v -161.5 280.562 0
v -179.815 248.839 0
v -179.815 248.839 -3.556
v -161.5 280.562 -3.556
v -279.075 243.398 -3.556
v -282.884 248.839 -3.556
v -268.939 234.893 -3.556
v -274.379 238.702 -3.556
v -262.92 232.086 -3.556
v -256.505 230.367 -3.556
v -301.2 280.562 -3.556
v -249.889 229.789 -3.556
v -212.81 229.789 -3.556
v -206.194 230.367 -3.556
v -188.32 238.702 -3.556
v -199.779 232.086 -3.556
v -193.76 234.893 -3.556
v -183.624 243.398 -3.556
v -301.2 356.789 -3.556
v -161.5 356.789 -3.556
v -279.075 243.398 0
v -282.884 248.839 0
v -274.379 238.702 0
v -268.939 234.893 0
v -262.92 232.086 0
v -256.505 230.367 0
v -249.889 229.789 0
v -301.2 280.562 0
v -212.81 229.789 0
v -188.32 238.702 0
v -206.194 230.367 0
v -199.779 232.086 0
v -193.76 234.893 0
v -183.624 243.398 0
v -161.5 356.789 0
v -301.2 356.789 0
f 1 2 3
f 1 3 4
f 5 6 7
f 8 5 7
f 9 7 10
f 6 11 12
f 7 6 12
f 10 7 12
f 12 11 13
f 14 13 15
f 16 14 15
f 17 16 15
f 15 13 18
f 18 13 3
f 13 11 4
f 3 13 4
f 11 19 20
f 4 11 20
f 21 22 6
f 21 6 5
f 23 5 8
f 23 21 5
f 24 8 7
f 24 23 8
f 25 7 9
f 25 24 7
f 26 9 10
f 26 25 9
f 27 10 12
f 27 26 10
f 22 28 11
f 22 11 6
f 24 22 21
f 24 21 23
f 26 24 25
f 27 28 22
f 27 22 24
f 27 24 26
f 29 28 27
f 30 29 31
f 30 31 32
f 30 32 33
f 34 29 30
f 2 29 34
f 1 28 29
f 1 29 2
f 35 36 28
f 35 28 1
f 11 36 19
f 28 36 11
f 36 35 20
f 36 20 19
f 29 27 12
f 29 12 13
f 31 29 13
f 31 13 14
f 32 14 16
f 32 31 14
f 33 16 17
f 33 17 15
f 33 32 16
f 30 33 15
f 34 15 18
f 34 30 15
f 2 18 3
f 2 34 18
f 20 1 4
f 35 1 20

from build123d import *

# Parameters (mm, degrees)
BOSS_EXTRUDE1_DEPTH = 3.556


with BuildPart() as part:
    # Sketch1 → Boss-Extrude1 (new body)
    with BuildSketch(Plane.XY):
        with BuildLine():
            Line((-161.499532604, 280.561645896), (-161.499532604, 356.788581407))
            Line((-161.499532604, 356.788581407), (-301.19953221, 356.788581407))
            Line((-301.19953221, 356.788581407), (-301.19953221, 280.561645896))
            Line((-301.19953221, 280.561645896), (-282.884212388, 248.838581407))
            ThreePointArc((-282.884212388, 248.838581407), (-268.938644504, 234.893013523), (-249.888644504, 229.788581407))
            Line((-249.888644504, 229.788581407), (-212.81042031, 229.788581407))
            ThreePointArc((-212.81042031, 229.788581407), (-193.76042031, 234.893013523), (-179.814852426, 248.838581407))
            Line((-179.814852426, 248.838581407), (-161.499532604, 280.561645896))
        make_face()
    extrude(amount=-BOSS_EXTRUDE1_DEPTH)


solid = part.part
